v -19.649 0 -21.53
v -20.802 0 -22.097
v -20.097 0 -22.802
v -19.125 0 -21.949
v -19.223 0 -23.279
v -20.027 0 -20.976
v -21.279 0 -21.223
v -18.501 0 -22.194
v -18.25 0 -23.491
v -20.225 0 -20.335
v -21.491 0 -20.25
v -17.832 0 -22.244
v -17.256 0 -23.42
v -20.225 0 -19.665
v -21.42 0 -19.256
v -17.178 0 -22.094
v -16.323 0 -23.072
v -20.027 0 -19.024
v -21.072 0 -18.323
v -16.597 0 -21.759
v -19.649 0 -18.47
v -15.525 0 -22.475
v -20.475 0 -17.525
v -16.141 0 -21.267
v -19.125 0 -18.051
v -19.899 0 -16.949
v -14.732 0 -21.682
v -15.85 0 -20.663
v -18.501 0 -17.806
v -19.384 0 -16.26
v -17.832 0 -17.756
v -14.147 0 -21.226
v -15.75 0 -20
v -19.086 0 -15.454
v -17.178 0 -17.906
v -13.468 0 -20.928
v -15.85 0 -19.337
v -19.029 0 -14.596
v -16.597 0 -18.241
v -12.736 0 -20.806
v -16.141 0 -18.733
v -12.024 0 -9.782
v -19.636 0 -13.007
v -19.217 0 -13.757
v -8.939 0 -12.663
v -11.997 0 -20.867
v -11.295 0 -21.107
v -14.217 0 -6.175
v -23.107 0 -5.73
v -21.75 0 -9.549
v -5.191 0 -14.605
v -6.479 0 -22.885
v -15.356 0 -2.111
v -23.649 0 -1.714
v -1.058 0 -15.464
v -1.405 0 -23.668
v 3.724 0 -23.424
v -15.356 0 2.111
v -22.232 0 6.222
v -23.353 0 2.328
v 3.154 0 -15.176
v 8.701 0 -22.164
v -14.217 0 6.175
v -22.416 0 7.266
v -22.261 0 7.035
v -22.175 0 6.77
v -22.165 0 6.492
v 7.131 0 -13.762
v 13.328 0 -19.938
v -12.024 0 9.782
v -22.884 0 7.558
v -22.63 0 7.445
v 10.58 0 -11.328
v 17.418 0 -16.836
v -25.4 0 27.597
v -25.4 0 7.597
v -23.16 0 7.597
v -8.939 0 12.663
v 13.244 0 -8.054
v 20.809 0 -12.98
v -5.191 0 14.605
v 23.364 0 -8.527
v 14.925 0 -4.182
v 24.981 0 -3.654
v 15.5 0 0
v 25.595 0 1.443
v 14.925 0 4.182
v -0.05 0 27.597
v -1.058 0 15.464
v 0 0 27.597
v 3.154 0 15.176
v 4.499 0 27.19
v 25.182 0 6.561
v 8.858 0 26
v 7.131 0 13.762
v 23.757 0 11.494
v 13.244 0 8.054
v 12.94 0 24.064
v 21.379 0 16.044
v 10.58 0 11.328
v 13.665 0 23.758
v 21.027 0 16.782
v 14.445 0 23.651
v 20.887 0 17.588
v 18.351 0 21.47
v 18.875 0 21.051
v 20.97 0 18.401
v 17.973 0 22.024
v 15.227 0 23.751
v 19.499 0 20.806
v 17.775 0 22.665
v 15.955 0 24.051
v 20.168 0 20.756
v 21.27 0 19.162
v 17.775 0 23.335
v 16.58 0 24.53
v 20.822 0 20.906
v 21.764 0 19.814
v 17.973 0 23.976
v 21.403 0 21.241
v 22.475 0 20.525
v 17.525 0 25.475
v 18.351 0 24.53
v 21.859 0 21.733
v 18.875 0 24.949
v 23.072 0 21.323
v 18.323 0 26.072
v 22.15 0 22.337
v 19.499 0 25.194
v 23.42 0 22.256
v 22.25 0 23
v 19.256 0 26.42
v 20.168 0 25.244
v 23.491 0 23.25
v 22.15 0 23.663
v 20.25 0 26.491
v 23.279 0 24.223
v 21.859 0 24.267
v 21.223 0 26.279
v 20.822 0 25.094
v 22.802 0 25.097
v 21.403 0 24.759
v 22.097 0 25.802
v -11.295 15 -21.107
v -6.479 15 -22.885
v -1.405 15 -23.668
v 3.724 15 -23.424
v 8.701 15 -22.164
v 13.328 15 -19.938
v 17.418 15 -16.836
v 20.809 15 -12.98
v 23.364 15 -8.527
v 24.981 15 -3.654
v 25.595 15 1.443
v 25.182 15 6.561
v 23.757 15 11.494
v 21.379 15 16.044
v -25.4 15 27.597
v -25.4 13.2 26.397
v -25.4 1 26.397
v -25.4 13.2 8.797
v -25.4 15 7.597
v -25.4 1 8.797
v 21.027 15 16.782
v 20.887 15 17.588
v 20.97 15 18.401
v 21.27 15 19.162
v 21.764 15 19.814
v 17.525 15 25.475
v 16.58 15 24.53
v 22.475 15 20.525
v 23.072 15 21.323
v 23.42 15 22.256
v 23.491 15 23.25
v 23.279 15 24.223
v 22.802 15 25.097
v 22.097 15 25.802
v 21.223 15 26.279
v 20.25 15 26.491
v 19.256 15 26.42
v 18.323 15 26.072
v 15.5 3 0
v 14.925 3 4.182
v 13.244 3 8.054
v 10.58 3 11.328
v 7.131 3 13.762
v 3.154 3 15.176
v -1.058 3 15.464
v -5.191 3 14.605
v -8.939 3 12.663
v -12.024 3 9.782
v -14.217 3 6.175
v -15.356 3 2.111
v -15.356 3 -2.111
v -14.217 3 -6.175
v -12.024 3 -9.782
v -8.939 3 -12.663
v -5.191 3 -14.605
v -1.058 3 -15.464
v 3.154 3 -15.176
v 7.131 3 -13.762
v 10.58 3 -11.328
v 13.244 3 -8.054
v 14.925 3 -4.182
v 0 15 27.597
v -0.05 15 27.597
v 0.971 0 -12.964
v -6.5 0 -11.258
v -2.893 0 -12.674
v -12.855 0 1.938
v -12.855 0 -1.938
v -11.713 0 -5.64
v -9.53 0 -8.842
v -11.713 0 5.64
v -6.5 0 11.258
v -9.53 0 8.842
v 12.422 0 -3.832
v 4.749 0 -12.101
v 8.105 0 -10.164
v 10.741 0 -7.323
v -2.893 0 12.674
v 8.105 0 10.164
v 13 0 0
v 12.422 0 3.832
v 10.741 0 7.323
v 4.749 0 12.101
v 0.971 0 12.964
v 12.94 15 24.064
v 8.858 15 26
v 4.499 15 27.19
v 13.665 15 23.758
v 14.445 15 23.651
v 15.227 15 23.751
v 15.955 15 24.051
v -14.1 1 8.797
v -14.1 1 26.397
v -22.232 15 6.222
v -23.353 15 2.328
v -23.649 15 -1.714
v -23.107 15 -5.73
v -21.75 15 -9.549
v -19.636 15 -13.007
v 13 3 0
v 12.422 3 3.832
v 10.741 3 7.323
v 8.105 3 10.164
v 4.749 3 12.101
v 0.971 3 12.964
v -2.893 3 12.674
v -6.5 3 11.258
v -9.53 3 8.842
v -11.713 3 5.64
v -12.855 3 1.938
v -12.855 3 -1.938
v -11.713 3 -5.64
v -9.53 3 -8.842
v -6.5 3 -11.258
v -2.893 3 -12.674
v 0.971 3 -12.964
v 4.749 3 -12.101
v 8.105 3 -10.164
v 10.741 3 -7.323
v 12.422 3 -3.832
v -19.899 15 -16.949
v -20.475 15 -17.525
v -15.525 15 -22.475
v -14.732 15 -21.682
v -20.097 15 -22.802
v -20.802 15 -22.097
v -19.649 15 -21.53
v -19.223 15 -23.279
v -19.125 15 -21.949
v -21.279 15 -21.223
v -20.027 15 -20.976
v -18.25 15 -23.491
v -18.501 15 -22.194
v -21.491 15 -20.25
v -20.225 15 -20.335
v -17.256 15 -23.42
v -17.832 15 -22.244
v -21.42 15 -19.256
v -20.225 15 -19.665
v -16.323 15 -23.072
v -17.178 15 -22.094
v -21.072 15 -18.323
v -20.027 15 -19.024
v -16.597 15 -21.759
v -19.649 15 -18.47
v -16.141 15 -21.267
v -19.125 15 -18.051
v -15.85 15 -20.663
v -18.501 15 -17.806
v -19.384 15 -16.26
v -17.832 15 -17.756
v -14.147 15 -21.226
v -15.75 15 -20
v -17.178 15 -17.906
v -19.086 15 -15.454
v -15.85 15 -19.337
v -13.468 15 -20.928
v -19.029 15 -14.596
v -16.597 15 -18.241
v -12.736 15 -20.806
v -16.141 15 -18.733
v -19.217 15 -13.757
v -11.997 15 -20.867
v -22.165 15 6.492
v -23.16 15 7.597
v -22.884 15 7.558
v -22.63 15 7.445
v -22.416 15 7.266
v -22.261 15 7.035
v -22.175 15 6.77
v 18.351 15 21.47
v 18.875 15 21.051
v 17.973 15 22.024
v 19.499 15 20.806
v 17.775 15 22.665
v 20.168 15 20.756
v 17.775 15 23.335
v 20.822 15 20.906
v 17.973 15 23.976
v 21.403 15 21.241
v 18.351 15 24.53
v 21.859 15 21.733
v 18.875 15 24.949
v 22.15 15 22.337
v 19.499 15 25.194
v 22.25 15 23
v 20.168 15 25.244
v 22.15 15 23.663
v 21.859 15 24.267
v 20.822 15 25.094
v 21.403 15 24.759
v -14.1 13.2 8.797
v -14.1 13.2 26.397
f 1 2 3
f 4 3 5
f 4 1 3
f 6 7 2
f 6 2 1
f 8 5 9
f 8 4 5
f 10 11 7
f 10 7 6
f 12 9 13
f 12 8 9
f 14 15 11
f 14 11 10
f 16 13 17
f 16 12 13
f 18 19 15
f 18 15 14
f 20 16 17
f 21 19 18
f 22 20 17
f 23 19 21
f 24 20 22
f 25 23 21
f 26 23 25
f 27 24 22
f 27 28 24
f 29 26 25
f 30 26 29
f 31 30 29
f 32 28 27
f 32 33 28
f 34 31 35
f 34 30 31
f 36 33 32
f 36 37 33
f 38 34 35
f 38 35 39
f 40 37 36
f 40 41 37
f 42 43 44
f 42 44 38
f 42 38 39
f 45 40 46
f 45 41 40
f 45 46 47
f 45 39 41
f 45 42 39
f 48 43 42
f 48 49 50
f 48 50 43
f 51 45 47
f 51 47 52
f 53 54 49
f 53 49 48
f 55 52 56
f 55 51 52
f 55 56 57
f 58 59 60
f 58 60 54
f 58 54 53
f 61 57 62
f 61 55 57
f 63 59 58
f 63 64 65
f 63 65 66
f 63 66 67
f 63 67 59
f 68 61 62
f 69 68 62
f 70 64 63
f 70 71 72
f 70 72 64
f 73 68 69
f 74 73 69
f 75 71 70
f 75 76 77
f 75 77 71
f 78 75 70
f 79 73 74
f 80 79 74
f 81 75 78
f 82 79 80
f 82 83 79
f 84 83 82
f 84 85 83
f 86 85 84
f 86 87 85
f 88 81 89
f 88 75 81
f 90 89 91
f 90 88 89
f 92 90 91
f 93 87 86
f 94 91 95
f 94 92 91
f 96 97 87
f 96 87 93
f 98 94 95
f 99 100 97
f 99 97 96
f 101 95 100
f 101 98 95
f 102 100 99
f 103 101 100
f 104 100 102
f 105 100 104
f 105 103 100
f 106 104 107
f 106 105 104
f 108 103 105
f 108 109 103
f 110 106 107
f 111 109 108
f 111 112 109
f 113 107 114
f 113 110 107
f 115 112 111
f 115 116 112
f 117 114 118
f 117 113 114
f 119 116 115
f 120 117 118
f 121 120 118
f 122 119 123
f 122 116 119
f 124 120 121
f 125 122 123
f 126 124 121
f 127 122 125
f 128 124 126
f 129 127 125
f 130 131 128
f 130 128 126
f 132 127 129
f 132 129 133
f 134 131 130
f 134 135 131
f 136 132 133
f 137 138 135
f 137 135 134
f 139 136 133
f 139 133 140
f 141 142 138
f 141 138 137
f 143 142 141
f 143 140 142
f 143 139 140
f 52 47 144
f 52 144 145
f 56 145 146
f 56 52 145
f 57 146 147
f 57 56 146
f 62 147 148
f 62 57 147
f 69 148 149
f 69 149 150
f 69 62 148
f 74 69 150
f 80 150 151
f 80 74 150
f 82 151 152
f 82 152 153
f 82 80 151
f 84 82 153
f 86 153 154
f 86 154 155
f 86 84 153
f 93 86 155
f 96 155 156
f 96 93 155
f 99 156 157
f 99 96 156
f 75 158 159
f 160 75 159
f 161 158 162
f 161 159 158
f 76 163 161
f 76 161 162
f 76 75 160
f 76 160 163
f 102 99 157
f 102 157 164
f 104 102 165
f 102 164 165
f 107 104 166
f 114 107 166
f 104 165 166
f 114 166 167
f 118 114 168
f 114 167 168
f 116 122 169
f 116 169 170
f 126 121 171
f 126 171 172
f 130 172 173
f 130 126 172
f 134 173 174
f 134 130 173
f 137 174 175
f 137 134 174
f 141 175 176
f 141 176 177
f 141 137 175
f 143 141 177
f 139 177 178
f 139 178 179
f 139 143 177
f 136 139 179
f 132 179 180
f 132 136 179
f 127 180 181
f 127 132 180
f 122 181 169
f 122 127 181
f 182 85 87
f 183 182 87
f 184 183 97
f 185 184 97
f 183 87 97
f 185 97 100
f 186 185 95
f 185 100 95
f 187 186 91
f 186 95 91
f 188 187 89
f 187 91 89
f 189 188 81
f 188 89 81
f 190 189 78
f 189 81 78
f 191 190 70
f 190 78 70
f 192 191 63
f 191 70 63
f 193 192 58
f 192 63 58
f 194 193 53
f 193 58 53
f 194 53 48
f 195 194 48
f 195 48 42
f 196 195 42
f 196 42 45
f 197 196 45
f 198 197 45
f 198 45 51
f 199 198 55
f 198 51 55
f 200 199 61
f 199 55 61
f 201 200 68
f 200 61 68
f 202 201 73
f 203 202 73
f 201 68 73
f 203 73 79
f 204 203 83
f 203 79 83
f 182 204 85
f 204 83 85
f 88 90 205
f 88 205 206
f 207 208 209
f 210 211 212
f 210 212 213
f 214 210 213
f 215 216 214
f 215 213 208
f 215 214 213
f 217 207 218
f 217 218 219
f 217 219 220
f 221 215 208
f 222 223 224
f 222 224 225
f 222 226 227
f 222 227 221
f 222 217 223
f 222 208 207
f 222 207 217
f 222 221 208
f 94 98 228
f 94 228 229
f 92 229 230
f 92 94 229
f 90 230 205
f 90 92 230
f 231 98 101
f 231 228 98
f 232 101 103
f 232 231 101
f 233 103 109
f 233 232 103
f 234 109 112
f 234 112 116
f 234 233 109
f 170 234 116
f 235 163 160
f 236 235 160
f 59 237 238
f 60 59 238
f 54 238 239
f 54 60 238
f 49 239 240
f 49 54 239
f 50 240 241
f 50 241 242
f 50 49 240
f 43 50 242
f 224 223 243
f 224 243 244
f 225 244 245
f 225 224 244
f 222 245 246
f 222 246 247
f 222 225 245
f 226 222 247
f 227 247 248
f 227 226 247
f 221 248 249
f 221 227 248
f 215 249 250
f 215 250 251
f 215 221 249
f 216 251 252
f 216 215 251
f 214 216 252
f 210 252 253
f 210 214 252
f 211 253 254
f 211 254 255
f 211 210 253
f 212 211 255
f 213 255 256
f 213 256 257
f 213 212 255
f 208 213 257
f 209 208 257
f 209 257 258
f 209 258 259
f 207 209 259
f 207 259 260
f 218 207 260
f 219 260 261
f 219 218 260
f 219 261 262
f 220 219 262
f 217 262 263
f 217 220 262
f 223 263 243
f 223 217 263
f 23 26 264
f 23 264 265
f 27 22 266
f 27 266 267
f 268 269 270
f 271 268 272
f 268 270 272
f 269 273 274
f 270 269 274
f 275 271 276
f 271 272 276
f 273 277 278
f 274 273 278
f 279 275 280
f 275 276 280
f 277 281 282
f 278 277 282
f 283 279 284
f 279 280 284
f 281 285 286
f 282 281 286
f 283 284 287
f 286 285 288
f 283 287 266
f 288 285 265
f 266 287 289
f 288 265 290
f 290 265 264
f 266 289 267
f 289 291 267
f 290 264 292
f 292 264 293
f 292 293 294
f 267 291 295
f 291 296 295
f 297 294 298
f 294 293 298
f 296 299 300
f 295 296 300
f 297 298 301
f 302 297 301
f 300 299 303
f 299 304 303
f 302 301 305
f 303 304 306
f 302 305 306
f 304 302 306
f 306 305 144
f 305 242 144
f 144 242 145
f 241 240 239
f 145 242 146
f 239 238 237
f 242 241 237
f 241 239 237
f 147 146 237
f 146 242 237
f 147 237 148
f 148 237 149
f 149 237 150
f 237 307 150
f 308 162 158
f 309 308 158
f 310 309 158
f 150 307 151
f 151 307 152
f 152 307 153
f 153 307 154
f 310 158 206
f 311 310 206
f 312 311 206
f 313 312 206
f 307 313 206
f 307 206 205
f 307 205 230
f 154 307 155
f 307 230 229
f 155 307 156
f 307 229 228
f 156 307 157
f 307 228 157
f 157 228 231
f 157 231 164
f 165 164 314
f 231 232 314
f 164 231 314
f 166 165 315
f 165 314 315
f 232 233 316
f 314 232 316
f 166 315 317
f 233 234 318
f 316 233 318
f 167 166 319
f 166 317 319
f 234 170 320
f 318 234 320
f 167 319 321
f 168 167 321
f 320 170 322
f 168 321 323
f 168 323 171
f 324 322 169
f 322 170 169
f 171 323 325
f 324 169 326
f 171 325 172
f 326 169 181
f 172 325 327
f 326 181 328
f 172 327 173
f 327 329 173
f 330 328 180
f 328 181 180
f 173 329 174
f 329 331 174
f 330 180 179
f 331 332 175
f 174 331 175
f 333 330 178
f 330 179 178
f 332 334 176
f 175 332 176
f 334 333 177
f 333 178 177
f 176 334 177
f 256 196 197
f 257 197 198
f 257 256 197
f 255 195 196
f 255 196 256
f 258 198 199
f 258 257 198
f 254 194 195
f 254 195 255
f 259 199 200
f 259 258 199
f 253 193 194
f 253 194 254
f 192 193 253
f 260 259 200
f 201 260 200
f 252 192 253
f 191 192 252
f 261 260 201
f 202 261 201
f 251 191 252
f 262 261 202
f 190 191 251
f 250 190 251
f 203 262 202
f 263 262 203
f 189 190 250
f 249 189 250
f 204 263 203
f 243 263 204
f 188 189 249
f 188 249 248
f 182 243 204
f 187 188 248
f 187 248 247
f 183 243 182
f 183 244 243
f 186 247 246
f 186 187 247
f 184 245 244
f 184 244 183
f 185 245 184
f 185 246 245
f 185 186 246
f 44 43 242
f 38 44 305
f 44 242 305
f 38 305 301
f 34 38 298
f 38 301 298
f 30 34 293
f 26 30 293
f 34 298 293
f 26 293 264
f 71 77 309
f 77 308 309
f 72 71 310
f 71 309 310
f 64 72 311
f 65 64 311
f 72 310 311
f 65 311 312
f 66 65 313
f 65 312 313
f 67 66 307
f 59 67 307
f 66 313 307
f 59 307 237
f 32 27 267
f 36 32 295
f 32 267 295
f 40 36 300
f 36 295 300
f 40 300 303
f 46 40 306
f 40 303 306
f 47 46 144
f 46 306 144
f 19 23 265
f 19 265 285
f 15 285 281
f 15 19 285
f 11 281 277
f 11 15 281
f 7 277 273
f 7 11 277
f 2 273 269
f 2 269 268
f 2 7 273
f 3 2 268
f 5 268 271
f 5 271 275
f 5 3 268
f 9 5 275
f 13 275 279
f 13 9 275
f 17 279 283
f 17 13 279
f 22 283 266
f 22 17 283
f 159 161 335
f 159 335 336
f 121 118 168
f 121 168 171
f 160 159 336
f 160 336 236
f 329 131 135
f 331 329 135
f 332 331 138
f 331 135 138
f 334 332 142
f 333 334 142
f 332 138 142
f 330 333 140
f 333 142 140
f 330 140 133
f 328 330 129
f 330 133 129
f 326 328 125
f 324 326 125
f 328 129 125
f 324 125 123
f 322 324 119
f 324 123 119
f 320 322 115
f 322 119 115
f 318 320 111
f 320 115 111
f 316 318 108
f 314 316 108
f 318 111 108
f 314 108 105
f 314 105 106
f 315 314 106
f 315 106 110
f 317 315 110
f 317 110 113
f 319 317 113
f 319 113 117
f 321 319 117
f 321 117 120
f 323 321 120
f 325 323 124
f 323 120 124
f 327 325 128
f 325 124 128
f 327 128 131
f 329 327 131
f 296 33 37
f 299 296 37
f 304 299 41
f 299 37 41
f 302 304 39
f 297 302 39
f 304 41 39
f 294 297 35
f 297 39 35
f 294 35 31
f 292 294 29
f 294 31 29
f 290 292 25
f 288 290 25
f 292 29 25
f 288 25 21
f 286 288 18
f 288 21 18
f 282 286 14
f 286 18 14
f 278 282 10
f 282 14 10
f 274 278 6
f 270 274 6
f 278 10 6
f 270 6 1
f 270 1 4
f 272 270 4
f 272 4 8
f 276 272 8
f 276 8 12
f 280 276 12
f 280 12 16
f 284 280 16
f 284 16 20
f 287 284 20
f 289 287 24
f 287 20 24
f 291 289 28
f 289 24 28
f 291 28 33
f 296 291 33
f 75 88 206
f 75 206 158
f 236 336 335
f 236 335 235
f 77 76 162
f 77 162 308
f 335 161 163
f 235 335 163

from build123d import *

# Parameters (mm, degrees)
F0_R     = 2.25
F0_R_2   = 15.5
F0_R_3   = 13
F1_DEPTH = 15
F2_DEPTH = 3
F3_W     = 12.2
F3_H     = 17.6
F4_DEPTH = 11.3
F5_R     = 1
F6_R     = 3


# Not quite as in the source:
# - ends of sketch curves that miss each other by under 0.0002 mm in the source are joined


with BuildPart() as f1:
    # F0 (on Front) → F1 (new body)
    with BuildSketch(Plane.XZ):
        with BuildLine():
            Line((-0.05, 27.5966813602), (-25.4, 27.5966813602))
            Line((-25.4, 27.5966813602), (-25.4, 7.5966813602))
            Line((-25.4, 7.5966813602), (-21.614542231, 7.5966813602))
            ThreePointArc((-21.614542231, 7.5966813602), (-23.4006244197, -4.2813010605), (-17.918619958, -14.9688724896))
            Line((-17.918619958, -14.9688724896), (-20.4748737342, -17.5251262658))
            ThreePointArc((-20.4748737342, -17.5251262658), (-20.4748737342, -22.4748737342), (-15.5251262658, -22.4748737342))
            Line((-15.5251262658, -22.4748737342), (-13.153804753, -20.1035522213))
            ThreePointArc((-13.153804753, -20.1035522213), (19.3130689129, -14.8757459996), (19.9528476572, 18.0031001889))
            Line((19.9528476572, 18.0031001889), (22.4748737342, 20.5251262658))
            ThreePointArc((22.4748737342, 20.5251262658), (22.4748737342, 25.4748737342), (17.5251262658, 25.4748737342))
            Line((17.5251262658, 25.4748737342), (14.8648475796, 22.8145950479))
            ThreePointArc((14.8648475796, 22.8145950479), (7.8051661925, 26.3642746914), (-9.5e-08, 27.5966326274))
            Line((-9.5e-08, 27.5966326274), (-0.05, 27.5966813602))
        make_face()
        with Locations((-18, -20)):
            Circle(F0_R, mode=Mode.SUBTRACT)
        Circle(F0_R_2, mode=Mode.SUBTRACT)
        with Locations((20, 23)):
            Circle(F0_R, mode=Mode.SUBTRACT)
        Circle(F0_R_2)
        Circle(F0_R_3, mode=Mode.SUBTRACT)
        Circle(F0_R_3)
    extrude(amount=-F1_DEPTH)

    # F0 (on Front) → F2 (cut)
    with BuildSketch(Plane.XZ):
        Circle(F0_R_2)
        Circle(F0_R_3, mode=Mode.SUBTRACT)
    extrude(amount=-F2_DEPTH, mode=Mode.SUBTRACT)

    # F3 (on face) → F4 (cut)
    with BuildSketch(Plane(origin=(-25.4, 0, 0), x_dir=(0, -1, 0), z_dir=(-1, 0, 0))):
        with Locations((-7.1, 17.5966813602)):
            Rectangle(F3_W, F3_H)
    extrude(amount=-F4_DEPTH, mode=Mode.SUBTRACT)

    # F5
    f5_edges = [f1.edges().sort_by_distance(p)[0] for p in [
        (-21.614542, 7.5, 7.596681),
    ]]
    fillet(f5_edges, radius=F5_R)

    # F6
    f6_edges = [f1.edges().sort_by_distance(p)[0] for p in [
        (-17.91862, 7.5, -14.968872),
        (-13.153805, 7.5, -20.103552),
        (19.952848, 7.5, 18.0031),
        (14.864848, 7.5, 22.814595),
    ]]
    fillet(f6_edges, radius=F6_R)


solid = f1.part
